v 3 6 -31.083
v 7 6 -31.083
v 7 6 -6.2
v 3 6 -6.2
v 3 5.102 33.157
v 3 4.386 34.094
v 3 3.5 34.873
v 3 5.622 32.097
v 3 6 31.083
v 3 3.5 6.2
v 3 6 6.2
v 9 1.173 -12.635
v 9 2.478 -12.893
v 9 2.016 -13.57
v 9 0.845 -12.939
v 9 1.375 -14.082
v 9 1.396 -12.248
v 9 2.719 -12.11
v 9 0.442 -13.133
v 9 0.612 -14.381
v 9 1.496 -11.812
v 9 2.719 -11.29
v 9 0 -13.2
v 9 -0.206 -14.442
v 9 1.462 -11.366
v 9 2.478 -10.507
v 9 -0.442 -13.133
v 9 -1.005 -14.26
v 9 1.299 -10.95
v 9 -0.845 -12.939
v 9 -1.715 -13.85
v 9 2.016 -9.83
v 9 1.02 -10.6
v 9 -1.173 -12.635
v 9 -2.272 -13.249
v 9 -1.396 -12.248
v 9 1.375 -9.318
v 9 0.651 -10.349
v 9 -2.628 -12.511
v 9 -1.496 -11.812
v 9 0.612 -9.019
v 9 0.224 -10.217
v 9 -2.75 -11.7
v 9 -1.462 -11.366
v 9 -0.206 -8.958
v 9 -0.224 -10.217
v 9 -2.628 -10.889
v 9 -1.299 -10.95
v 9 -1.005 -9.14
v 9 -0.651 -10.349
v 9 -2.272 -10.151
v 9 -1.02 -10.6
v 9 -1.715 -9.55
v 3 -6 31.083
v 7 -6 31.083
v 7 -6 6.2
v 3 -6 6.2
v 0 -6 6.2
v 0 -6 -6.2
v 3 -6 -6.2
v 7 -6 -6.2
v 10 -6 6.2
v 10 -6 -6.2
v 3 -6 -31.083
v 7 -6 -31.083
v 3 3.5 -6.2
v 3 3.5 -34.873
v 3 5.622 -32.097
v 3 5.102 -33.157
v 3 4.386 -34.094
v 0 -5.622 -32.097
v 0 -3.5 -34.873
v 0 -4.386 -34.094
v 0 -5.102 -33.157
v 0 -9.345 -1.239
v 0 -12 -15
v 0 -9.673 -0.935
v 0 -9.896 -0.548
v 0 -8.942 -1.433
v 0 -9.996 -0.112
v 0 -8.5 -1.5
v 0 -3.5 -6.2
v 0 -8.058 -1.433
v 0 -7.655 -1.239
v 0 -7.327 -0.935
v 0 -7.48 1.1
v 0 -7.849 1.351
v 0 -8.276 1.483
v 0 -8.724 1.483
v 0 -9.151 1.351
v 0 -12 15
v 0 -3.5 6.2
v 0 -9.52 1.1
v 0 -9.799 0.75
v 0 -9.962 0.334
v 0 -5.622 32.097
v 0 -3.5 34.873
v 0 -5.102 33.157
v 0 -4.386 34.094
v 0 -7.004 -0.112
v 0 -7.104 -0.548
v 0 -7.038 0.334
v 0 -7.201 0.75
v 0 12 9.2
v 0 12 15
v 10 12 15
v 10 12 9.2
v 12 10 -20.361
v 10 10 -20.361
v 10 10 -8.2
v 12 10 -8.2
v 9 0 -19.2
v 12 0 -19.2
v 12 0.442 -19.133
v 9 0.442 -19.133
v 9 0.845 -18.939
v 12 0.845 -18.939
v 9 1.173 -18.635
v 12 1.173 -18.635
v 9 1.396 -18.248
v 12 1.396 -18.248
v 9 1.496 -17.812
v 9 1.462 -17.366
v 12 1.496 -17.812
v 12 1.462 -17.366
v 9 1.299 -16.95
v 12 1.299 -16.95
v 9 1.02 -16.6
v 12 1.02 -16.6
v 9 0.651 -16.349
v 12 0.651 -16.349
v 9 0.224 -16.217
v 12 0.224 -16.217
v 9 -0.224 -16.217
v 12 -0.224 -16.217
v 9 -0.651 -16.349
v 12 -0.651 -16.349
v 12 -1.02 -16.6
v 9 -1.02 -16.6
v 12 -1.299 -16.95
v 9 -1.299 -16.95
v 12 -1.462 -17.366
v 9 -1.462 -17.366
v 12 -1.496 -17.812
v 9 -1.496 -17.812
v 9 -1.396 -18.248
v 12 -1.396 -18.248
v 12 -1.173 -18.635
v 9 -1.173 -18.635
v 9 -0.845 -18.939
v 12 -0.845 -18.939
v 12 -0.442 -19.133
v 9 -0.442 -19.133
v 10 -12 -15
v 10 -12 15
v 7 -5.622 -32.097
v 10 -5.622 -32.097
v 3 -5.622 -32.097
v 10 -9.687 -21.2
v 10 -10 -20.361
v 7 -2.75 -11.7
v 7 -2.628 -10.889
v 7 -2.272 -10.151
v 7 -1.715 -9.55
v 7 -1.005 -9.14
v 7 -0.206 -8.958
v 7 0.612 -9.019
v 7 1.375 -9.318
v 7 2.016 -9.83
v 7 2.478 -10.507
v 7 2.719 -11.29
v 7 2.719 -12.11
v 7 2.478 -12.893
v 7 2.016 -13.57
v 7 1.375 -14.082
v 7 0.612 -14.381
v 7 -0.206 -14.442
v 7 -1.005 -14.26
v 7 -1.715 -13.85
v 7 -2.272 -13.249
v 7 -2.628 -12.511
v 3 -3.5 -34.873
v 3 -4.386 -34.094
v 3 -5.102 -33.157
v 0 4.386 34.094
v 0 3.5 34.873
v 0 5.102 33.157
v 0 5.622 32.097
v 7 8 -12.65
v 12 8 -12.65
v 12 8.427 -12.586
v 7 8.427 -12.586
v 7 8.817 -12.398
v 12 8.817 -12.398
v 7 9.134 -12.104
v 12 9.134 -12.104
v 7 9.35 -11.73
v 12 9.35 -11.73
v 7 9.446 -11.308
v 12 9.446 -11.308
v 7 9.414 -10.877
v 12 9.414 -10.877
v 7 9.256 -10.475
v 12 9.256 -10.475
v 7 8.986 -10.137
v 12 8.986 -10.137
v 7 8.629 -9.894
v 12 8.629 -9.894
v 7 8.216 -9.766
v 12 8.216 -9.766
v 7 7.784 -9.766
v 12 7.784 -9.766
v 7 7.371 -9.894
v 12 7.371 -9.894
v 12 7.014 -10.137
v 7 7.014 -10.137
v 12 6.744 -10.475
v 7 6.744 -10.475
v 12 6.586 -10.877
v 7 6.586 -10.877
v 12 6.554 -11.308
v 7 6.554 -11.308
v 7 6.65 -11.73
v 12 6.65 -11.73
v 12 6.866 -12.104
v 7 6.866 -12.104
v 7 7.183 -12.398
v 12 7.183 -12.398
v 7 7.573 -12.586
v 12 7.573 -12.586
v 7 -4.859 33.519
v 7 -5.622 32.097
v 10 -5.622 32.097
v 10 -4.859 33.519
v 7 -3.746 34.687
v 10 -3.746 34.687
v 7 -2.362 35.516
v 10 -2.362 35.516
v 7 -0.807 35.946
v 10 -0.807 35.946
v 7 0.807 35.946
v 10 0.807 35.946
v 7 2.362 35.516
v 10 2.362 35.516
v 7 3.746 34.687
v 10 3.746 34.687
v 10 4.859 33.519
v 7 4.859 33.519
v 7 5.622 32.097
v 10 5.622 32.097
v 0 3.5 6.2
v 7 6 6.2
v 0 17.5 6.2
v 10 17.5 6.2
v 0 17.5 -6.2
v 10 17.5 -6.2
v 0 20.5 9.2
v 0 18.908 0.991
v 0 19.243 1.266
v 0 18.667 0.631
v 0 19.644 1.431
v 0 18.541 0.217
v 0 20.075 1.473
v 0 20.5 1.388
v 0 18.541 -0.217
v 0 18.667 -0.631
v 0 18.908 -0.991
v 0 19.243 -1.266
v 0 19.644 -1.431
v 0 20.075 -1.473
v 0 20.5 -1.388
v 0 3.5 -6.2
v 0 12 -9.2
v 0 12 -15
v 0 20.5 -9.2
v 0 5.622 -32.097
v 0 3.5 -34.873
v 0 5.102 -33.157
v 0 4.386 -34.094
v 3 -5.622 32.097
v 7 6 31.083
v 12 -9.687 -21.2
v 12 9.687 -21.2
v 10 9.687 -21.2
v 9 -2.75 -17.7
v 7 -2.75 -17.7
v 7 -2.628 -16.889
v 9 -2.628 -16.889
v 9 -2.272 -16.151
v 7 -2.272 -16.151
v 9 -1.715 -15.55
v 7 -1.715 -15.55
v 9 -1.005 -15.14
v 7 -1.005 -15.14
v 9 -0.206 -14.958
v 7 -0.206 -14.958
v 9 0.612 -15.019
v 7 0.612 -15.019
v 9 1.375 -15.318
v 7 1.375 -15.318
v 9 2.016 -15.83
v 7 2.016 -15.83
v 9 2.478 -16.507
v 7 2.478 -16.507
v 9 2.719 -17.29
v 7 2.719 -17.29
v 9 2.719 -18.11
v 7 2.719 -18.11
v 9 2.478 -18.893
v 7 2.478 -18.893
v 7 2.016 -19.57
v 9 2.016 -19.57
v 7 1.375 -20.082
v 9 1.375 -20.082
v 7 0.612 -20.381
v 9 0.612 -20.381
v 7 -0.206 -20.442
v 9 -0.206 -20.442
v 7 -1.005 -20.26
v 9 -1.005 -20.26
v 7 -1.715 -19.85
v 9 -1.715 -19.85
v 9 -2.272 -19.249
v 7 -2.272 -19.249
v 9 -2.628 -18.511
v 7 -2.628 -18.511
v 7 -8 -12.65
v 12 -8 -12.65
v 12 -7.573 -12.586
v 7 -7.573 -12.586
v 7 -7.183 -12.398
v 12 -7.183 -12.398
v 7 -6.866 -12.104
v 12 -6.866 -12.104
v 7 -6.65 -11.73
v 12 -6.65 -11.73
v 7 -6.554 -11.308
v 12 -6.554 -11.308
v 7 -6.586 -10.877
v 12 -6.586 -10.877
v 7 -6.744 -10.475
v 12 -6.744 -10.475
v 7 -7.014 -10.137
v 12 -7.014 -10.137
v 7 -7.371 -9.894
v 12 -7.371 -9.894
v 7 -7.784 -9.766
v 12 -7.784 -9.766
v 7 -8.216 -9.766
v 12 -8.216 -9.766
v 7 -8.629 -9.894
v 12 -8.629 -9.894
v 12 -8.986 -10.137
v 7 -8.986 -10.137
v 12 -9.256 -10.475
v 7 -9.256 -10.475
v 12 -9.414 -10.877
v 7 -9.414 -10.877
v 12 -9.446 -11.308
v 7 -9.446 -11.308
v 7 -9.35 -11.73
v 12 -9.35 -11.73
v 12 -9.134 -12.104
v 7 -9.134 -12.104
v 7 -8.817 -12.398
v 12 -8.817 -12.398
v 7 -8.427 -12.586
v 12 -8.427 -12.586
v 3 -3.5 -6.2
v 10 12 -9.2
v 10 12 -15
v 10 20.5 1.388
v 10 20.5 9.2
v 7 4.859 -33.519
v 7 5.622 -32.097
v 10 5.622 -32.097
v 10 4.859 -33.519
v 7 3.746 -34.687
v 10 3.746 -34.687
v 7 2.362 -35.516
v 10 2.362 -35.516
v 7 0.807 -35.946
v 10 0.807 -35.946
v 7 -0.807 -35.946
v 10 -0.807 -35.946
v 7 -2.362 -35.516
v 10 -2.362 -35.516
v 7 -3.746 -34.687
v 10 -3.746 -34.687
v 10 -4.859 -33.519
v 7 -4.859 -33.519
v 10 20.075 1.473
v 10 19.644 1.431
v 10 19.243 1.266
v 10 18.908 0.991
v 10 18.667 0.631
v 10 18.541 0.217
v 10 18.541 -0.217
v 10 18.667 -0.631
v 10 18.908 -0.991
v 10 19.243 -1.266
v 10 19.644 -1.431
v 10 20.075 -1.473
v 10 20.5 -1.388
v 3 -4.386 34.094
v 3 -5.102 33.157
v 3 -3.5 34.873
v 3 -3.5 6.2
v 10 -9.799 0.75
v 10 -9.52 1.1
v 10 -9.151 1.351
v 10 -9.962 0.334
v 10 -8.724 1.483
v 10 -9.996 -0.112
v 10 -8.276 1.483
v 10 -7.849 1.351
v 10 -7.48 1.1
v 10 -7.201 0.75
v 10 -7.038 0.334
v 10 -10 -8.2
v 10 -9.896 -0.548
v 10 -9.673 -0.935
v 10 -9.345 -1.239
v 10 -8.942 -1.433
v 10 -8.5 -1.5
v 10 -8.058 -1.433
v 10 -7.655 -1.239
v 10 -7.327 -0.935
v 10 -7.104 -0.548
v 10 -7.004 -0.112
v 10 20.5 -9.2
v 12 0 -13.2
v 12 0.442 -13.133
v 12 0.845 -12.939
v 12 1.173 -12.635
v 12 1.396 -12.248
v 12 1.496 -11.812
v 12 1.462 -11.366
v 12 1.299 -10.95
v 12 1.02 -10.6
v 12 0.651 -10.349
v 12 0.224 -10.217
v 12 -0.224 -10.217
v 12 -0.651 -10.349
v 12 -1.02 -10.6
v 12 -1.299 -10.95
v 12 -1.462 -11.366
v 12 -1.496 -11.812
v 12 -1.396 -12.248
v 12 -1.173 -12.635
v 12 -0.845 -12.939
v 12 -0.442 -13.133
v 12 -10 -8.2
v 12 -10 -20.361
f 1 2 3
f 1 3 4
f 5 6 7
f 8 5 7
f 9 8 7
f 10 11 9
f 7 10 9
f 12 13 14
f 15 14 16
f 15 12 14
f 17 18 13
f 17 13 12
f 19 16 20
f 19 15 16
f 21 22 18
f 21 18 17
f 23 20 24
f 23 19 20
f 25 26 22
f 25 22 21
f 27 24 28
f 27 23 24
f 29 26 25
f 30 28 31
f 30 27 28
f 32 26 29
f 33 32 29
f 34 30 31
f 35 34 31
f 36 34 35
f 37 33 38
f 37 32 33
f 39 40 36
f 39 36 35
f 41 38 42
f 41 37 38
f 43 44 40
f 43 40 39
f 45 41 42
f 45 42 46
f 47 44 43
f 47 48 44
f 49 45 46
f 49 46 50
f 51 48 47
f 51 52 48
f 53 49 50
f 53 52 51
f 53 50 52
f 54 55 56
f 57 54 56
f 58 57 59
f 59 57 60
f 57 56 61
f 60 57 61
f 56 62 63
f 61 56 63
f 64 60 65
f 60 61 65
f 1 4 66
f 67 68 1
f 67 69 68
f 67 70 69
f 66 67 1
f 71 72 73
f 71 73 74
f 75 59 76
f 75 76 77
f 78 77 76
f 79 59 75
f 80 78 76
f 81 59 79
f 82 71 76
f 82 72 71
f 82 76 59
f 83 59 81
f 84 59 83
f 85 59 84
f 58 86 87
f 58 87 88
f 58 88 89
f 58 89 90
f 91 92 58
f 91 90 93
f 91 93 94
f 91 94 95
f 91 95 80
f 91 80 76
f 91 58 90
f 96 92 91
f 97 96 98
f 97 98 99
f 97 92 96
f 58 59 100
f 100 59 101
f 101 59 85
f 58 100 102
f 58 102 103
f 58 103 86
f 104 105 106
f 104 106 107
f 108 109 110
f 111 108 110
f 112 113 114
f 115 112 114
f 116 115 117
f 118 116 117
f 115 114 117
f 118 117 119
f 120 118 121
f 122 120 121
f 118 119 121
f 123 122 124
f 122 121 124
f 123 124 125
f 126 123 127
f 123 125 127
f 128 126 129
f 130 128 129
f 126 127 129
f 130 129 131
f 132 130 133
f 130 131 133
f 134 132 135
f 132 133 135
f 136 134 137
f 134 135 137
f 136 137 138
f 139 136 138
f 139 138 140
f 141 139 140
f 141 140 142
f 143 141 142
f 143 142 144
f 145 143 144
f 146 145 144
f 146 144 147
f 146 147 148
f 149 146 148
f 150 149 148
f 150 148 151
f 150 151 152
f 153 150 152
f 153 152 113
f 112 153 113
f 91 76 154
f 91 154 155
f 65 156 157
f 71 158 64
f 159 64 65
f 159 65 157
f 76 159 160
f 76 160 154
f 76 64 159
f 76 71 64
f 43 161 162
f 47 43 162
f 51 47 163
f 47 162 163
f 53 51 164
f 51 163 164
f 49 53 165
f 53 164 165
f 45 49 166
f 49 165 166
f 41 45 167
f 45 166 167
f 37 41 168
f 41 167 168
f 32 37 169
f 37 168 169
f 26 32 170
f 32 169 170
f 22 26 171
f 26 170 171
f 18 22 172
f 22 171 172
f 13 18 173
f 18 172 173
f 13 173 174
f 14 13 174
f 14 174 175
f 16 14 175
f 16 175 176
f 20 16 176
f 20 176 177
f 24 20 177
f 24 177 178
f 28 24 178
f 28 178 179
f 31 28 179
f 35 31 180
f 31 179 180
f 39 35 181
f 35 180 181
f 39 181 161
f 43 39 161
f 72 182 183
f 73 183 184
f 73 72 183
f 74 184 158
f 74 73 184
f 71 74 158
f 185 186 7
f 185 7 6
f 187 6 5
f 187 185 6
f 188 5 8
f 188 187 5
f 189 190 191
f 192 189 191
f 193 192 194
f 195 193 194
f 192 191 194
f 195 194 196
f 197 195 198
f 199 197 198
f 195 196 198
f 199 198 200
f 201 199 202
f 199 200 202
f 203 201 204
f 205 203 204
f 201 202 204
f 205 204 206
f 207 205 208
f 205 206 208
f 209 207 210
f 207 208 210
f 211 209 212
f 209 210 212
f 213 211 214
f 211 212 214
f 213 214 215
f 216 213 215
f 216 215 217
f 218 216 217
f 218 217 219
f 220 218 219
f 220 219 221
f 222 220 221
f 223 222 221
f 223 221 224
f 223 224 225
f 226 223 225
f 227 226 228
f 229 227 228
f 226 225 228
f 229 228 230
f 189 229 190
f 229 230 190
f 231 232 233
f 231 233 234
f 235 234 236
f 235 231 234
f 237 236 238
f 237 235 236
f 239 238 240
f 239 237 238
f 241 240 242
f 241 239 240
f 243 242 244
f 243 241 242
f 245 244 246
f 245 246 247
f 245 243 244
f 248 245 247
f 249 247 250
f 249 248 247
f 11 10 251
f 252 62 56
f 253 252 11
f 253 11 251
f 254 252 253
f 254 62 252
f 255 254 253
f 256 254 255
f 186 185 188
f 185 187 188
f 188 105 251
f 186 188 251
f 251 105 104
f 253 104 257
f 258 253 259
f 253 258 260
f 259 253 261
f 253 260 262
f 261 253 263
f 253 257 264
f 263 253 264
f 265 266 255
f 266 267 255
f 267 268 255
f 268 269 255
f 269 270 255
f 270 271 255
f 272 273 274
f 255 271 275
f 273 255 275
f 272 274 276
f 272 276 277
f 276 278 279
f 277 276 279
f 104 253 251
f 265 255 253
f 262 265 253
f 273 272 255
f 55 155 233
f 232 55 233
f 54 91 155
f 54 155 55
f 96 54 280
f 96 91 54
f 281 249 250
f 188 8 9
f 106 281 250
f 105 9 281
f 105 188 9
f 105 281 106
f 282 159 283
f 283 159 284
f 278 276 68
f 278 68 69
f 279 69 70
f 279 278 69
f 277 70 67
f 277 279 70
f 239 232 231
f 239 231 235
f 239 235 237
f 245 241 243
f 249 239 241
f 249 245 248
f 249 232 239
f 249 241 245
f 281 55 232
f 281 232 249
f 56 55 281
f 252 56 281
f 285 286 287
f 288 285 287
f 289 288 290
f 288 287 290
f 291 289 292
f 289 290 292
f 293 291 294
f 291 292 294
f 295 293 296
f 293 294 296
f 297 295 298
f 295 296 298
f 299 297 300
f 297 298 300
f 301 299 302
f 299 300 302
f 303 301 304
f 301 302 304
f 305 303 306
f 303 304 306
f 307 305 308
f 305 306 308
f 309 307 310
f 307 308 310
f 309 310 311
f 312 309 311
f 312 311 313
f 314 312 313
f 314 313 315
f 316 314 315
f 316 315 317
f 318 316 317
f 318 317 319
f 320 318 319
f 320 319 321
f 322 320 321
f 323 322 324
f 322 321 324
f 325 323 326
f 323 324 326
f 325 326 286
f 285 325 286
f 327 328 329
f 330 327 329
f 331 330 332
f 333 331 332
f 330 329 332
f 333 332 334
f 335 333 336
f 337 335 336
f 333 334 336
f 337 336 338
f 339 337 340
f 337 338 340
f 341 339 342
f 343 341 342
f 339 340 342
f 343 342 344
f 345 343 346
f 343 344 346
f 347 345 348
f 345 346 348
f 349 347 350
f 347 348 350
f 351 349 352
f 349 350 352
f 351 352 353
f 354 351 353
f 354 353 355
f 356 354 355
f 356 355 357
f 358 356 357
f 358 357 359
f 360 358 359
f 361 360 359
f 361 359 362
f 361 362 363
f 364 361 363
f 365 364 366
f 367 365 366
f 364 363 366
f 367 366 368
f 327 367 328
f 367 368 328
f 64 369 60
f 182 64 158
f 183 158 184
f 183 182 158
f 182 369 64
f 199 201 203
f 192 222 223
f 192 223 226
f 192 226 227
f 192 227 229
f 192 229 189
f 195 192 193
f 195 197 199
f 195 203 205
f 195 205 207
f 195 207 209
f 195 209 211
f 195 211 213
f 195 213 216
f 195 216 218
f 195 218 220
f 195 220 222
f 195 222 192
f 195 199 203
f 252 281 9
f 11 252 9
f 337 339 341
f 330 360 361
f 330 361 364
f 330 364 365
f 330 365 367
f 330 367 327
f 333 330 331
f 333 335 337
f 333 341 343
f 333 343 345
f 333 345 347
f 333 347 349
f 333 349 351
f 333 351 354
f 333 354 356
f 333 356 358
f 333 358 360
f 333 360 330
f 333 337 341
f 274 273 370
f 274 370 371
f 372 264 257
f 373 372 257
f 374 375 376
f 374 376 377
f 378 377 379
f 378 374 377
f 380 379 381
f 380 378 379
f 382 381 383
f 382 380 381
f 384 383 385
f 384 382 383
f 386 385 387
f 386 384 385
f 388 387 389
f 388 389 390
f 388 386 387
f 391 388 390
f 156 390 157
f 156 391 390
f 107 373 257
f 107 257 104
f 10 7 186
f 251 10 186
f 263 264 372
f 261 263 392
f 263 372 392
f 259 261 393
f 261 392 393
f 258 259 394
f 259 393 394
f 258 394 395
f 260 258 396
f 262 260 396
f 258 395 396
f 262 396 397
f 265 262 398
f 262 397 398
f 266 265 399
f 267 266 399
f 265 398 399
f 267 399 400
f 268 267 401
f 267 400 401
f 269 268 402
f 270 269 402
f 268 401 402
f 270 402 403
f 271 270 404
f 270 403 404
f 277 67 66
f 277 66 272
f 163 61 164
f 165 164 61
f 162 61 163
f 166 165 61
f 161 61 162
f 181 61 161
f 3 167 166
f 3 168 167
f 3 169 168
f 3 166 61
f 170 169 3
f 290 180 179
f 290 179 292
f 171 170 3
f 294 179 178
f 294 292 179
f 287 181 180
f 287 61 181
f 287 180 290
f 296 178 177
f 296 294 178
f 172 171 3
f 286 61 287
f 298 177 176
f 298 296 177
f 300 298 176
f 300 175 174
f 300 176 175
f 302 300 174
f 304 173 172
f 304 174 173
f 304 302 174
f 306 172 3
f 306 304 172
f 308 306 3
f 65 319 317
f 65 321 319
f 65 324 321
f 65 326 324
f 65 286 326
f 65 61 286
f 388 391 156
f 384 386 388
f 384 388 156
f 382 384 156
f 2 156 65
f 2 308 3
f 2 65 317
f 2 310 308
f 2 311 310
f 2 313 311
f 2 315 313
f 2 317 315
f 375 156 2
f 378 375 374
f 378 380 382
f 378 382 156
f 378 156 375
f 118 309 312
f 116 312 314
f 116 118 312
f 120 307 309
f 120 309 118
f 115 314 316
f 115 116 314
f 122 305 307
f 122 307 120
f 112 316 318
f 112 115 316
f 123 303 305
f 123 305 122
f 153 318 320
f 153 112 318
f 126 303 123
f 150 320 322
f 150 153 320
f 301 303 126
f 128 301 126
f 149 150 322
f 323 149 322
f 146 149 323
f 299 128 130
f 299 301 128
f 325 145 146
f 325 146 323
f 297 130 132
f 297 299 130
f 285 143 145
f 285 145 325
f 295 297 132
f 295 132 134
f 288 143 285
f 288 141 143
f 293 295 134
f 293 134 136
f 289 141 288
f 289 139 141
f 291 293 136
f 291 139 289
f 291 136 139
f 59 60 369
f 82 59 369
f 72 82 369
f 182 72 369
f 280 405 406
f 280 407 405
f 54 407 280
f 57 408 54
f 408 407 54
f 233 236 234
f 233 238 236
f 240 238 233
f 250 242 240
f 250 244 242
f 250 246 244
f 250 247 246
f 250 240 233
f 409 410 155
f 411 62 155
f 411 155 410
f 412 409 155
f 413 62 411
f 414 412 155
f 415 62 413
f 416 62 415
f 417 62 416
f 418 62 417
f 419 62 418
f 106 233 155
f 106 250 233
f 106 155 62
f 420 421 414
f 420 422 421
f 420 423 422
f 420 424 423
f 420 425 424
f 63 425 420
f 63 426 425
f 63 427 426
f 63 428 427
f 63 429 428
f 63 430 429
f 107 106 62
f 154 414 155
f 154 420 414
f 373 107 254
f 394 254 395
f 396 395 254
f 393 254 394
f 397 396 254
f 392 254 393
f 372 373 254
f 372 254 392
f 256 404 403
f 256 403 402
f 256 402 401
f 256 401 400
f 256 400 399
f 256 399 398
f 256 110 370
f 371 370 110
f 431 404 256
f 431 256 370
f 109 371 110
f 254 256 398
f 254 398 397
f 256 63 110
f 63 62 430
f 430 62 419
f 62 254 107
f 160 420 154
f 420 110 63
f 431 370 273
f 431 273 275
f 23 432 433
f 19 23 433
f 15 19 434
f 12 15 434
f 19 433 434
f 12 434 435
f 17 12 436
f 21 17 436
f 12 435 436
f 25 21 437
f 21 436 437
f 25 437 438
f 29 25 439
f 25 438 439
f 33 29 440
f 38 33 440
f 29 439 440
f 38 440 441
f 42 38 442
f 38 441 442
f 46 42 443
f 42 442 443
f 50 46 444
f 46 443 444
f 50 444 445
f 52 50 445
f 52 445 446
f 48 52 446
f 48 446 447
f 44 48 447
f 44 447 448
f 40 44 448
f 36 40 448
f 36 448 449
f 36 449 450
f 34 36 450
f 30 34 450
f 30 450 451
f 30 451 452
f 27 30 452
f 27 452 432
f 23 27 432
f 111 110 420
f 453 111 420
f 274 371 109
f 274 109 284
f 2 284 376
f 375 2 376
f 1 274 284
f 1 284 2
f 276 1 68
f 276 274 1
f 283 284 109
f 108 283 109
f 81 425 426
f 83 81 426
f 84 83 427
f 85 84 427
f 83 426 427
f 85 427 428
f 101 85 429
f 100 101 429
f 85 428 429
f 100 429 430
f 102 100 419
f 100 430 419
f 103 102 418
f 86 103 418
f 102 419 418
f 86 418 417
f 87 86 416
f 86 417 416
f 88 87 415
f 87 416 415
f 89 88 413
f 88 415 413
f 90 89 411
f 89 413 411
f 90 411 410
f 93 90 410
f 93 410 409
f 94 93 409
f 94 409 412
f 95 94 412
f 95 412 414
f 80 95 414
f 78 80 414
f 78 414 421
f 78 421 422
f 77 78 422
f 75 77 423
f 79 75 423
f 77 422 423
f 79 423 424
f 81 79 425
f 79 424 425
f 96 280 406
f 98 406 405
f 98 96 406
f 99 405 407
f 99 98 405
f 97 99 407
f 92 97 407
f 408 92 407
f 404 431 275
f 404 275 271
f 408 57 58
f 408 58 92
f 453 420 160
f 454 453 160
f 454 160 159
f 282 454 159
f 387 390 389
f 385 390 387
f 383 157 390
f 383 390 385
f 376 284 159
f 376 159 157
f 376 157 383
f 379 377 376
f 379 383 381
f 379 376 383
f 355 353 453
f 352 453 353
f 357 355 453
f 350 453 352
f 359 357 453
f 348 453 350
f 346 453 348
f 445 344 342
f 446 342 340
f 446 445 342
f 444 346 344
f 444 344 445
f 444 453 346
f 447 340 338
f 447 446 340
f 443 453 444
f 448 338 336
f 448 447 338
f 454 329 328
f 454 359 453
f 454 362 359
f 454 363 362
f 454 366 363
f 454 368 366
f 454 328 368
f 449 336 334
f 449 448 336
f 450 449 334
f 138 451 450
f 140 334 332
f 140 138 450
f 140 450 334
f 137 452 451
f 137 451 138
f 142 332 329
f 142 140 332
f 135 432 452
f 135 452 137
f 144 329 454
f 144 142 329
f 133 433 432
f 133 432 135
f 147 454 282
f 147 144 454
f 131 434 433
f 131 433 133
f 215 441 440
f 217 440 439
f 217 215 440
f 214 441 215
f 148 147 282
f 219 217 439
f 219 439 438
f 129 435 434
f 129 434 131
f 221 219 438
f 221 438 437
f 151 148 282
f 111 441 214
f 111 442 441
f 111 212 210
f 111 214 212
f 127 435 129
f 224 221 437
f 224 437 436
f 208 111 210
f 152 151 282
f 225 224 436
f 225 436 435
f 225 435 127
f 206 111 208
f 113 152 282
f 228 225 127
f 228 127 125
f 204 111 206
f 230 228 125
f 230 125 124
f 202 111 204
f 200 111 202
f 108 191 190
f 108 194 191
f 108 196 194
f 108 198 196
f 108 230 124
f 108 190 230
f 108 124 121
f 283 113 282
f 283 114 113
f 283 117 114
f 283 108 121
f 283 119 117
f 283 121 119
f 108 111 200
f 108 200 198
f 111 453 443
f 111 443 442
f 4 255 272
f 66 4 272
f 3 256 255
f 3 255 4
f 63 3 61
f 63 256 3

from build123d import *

# Parameters (mm, degrees)
EXTRUDE_1_DEPTH          = 10
CUT_EXTRUDE_1_DEPTH      = 74.674961826
CUT_EXTRUDE_1_DEPTH_BACK = 74.674961826
SKETCH_3_W               = 12.4
SKETCH_3_H               = 18
CUT_EXTRUDE_4_DEPTH      = 10
EXTRUDE_3_DEPTH          = 10
SKETCH_5_R               = 1.4
CUT_EXTRUDE_5_DEPTH      = 10
SKETCH_6_R               = 1.475
SKETCH_6_R_2             = 1.5
CUT_EXTRUDE_6_DEPTH      = 10
EXTRUDE_4_DEPTH          = 2
SKETCH_8_R               = 1.5
CUT_EXTRUDE_8_DEPTH      = 44.130615576
SKETCH_9_R               = 2.75
CUT_EXTRUDE_9_DEPTH      = 2
SKETCH_10_R              = 1.45
CUT_EXTRUDE_10_DEPTH     = 5


with BuildPart() as part:
    # 草图1 → 凸台-拉伸1 (new body)
    with BuildSketch(Plane(origin=(0, 0, 0), x_dir=(0, 0, -1), z_dir=(1, 0, 0))):
        with BuildLine():
            Line((-32.097226847, 5.621533559), (-15, 12))
            Line((-15, 12), (15, 12))
            Line((15, 12), (32.097226847, 5.621533559))
            ThreePointArc((32.097226847, 5.621533559), (36, 0), (32.097226847, -5.621533559))
            Line((32.097226847, -5.621533559), (15, -12))
            Line((15, -12), (-15, -12))
            Line((-15, -12), (-32.097226847, -5.621533559))
            ThreePointArc((-32.097226847, -5.621533559), (-36, 0), (-32.097226847, 5.621533559))
        make_face()
    extrude(amount=EXTRUDE_1_DEPTH)

    # 草图2 → 切除-拉伸1 (cut, two sides: drawn at the far end of the back side and taken through both)
    with BuildSketch(Plane.XY.offset(36).offset(-CUT_EXTRUDE_1_DEPTH_BACK)):
        Polygon((0, -3.5), (3, -3.5), (3, -6), (7, -6), (7, 6), (3, 6), (3, 3.5), (0, 3.5), align=None)
    extrude(amount=CUT_EXTRUDE_1_DEPTH + CUT_EXTRUDE_1_DEPTH_BACK, mode=Mode.SUBTRACT)

    # 草图3 → 切除-拉伸4 (cut)
    with BuildSketch(Plane(origin=(10, 0, 0), x_dir=(0, 0, -1), z_dir=(1, 0, 0))):
        with Locations((0, 3)):
            Rectangle(SKETCH_3_W, SKETCH_3_H)
    extrude(amount=-CUT_EXTRUDE_4_DEPTH, mode=Mode.SUBTRACT)

    # 草图4 → 凸台-拉伸3 (add)
    with BuildSketch(Plane(origin=(10, 0, 0), x_dir=(0, 0, -1), z_dir=(1, 0, 0))):
        Polygon((-6.2, 17.5), (6.2, 17.5), (6.2, 12), (9.2, 12), (9.2, 20.5), (-9.2, 20.5), (-9.2, 12), (-6.2, 12), align=None)
    extrude(amount=-EXTRUDE_3_DEPTH)

    # 草图5 → 切除-拉伸5 (cut)
    with BuildSketch(Plane(origin=(10, 0, 0), x_dir=(0, 0, -1), z_dir=(1, 0, 0))):
        with Locations((0, -8.5)):
            Circle(SKETCH_5_R)
        with Locations((0, 20)):
            Circle(SKETCH_5_R)
    extrude(amount=-CUT_EXTRUDE_5_DEPTH, mode=Mode.SUBTRACT)

    # 草图6 → 切除-拉伸6 (cut)
    with BuildSketch(Plane(origin=(10, 0, 0), x_dir=(0, 0, -1), z_dir=(1, 0, 0))):
        with Locations((0, 20)):
            Circle(SKETCH_6_R)
        with Locations((0, -8.5)):
            Circle(SKETCH_6_R_2)
    extrude(amount=-CUT_EXTRUDE_6_DEPTH, mode=Mode.SUBTRACT)

    # 草图7 → 凸台-拉伸4 (add)
    with BuildSketch(Plane(origin=(10, 0, 0), x_dir=(0, 0, -1), z_dir=(1, 0, 0))):
        Polygon((8.2, -10), (20.360920843, -10), (21.2, -9.686964542), (21.2, 9.686964542), (20.360920843, 10), (8.2, 10), align=None)
    extrude(amount=EXTRUDE_4_DEPTH)

    # 草图8 → 切除-拉伸8 (cut, through all)
    with BuildSketch(Plane(origin=(12, 0, 0), x_dir=(0, 0, -1), z_dir=(1, 0, 0))):
        with Locations((11.7, 0)):
            Circle(SKETCH_8_R)
        with Locations((17.7, 0)):
            Circle(SKETCH_8_R)
    extrude(amount=-CUT_EXTRUDE_8_DEPTH, mode=Mode.SUBTRACT)

    # 草图9 → 切除-拉伸9 (cut)
    with BuildSketch(Plane.ZY.offset(-7)):
        with Locations(Location((-17.7, 0, 0), (0, 0, 270))):
            Circle(SKETCH_9_R)
        with Locations(Location((-11.7, 0, 0), (0, 0, 270))):
            Circle(SKETCH_9_R)
    extrude(amount=-CUT_EXTRUDE_9_DEPTH, mode=Mode.SUBTRACT)

    # 草图10 → 切除-拉伸10 (cut)
    with BuildSketch(Plane(origin=(12, 0, 0), x_dir=(0, 0, -1), z_dir=(1, 0, 0))):
        with Locations((11.2, 8)):
            Circle(SKETCH_10_R)
        with Locations((11.2, -8)):
            Circle(SKETCH_10_R)
    extrude(amount=-CUT_EXTRUDE_10_DEPTH, mode=Mode.SUBTRACT)


solid = part.part
